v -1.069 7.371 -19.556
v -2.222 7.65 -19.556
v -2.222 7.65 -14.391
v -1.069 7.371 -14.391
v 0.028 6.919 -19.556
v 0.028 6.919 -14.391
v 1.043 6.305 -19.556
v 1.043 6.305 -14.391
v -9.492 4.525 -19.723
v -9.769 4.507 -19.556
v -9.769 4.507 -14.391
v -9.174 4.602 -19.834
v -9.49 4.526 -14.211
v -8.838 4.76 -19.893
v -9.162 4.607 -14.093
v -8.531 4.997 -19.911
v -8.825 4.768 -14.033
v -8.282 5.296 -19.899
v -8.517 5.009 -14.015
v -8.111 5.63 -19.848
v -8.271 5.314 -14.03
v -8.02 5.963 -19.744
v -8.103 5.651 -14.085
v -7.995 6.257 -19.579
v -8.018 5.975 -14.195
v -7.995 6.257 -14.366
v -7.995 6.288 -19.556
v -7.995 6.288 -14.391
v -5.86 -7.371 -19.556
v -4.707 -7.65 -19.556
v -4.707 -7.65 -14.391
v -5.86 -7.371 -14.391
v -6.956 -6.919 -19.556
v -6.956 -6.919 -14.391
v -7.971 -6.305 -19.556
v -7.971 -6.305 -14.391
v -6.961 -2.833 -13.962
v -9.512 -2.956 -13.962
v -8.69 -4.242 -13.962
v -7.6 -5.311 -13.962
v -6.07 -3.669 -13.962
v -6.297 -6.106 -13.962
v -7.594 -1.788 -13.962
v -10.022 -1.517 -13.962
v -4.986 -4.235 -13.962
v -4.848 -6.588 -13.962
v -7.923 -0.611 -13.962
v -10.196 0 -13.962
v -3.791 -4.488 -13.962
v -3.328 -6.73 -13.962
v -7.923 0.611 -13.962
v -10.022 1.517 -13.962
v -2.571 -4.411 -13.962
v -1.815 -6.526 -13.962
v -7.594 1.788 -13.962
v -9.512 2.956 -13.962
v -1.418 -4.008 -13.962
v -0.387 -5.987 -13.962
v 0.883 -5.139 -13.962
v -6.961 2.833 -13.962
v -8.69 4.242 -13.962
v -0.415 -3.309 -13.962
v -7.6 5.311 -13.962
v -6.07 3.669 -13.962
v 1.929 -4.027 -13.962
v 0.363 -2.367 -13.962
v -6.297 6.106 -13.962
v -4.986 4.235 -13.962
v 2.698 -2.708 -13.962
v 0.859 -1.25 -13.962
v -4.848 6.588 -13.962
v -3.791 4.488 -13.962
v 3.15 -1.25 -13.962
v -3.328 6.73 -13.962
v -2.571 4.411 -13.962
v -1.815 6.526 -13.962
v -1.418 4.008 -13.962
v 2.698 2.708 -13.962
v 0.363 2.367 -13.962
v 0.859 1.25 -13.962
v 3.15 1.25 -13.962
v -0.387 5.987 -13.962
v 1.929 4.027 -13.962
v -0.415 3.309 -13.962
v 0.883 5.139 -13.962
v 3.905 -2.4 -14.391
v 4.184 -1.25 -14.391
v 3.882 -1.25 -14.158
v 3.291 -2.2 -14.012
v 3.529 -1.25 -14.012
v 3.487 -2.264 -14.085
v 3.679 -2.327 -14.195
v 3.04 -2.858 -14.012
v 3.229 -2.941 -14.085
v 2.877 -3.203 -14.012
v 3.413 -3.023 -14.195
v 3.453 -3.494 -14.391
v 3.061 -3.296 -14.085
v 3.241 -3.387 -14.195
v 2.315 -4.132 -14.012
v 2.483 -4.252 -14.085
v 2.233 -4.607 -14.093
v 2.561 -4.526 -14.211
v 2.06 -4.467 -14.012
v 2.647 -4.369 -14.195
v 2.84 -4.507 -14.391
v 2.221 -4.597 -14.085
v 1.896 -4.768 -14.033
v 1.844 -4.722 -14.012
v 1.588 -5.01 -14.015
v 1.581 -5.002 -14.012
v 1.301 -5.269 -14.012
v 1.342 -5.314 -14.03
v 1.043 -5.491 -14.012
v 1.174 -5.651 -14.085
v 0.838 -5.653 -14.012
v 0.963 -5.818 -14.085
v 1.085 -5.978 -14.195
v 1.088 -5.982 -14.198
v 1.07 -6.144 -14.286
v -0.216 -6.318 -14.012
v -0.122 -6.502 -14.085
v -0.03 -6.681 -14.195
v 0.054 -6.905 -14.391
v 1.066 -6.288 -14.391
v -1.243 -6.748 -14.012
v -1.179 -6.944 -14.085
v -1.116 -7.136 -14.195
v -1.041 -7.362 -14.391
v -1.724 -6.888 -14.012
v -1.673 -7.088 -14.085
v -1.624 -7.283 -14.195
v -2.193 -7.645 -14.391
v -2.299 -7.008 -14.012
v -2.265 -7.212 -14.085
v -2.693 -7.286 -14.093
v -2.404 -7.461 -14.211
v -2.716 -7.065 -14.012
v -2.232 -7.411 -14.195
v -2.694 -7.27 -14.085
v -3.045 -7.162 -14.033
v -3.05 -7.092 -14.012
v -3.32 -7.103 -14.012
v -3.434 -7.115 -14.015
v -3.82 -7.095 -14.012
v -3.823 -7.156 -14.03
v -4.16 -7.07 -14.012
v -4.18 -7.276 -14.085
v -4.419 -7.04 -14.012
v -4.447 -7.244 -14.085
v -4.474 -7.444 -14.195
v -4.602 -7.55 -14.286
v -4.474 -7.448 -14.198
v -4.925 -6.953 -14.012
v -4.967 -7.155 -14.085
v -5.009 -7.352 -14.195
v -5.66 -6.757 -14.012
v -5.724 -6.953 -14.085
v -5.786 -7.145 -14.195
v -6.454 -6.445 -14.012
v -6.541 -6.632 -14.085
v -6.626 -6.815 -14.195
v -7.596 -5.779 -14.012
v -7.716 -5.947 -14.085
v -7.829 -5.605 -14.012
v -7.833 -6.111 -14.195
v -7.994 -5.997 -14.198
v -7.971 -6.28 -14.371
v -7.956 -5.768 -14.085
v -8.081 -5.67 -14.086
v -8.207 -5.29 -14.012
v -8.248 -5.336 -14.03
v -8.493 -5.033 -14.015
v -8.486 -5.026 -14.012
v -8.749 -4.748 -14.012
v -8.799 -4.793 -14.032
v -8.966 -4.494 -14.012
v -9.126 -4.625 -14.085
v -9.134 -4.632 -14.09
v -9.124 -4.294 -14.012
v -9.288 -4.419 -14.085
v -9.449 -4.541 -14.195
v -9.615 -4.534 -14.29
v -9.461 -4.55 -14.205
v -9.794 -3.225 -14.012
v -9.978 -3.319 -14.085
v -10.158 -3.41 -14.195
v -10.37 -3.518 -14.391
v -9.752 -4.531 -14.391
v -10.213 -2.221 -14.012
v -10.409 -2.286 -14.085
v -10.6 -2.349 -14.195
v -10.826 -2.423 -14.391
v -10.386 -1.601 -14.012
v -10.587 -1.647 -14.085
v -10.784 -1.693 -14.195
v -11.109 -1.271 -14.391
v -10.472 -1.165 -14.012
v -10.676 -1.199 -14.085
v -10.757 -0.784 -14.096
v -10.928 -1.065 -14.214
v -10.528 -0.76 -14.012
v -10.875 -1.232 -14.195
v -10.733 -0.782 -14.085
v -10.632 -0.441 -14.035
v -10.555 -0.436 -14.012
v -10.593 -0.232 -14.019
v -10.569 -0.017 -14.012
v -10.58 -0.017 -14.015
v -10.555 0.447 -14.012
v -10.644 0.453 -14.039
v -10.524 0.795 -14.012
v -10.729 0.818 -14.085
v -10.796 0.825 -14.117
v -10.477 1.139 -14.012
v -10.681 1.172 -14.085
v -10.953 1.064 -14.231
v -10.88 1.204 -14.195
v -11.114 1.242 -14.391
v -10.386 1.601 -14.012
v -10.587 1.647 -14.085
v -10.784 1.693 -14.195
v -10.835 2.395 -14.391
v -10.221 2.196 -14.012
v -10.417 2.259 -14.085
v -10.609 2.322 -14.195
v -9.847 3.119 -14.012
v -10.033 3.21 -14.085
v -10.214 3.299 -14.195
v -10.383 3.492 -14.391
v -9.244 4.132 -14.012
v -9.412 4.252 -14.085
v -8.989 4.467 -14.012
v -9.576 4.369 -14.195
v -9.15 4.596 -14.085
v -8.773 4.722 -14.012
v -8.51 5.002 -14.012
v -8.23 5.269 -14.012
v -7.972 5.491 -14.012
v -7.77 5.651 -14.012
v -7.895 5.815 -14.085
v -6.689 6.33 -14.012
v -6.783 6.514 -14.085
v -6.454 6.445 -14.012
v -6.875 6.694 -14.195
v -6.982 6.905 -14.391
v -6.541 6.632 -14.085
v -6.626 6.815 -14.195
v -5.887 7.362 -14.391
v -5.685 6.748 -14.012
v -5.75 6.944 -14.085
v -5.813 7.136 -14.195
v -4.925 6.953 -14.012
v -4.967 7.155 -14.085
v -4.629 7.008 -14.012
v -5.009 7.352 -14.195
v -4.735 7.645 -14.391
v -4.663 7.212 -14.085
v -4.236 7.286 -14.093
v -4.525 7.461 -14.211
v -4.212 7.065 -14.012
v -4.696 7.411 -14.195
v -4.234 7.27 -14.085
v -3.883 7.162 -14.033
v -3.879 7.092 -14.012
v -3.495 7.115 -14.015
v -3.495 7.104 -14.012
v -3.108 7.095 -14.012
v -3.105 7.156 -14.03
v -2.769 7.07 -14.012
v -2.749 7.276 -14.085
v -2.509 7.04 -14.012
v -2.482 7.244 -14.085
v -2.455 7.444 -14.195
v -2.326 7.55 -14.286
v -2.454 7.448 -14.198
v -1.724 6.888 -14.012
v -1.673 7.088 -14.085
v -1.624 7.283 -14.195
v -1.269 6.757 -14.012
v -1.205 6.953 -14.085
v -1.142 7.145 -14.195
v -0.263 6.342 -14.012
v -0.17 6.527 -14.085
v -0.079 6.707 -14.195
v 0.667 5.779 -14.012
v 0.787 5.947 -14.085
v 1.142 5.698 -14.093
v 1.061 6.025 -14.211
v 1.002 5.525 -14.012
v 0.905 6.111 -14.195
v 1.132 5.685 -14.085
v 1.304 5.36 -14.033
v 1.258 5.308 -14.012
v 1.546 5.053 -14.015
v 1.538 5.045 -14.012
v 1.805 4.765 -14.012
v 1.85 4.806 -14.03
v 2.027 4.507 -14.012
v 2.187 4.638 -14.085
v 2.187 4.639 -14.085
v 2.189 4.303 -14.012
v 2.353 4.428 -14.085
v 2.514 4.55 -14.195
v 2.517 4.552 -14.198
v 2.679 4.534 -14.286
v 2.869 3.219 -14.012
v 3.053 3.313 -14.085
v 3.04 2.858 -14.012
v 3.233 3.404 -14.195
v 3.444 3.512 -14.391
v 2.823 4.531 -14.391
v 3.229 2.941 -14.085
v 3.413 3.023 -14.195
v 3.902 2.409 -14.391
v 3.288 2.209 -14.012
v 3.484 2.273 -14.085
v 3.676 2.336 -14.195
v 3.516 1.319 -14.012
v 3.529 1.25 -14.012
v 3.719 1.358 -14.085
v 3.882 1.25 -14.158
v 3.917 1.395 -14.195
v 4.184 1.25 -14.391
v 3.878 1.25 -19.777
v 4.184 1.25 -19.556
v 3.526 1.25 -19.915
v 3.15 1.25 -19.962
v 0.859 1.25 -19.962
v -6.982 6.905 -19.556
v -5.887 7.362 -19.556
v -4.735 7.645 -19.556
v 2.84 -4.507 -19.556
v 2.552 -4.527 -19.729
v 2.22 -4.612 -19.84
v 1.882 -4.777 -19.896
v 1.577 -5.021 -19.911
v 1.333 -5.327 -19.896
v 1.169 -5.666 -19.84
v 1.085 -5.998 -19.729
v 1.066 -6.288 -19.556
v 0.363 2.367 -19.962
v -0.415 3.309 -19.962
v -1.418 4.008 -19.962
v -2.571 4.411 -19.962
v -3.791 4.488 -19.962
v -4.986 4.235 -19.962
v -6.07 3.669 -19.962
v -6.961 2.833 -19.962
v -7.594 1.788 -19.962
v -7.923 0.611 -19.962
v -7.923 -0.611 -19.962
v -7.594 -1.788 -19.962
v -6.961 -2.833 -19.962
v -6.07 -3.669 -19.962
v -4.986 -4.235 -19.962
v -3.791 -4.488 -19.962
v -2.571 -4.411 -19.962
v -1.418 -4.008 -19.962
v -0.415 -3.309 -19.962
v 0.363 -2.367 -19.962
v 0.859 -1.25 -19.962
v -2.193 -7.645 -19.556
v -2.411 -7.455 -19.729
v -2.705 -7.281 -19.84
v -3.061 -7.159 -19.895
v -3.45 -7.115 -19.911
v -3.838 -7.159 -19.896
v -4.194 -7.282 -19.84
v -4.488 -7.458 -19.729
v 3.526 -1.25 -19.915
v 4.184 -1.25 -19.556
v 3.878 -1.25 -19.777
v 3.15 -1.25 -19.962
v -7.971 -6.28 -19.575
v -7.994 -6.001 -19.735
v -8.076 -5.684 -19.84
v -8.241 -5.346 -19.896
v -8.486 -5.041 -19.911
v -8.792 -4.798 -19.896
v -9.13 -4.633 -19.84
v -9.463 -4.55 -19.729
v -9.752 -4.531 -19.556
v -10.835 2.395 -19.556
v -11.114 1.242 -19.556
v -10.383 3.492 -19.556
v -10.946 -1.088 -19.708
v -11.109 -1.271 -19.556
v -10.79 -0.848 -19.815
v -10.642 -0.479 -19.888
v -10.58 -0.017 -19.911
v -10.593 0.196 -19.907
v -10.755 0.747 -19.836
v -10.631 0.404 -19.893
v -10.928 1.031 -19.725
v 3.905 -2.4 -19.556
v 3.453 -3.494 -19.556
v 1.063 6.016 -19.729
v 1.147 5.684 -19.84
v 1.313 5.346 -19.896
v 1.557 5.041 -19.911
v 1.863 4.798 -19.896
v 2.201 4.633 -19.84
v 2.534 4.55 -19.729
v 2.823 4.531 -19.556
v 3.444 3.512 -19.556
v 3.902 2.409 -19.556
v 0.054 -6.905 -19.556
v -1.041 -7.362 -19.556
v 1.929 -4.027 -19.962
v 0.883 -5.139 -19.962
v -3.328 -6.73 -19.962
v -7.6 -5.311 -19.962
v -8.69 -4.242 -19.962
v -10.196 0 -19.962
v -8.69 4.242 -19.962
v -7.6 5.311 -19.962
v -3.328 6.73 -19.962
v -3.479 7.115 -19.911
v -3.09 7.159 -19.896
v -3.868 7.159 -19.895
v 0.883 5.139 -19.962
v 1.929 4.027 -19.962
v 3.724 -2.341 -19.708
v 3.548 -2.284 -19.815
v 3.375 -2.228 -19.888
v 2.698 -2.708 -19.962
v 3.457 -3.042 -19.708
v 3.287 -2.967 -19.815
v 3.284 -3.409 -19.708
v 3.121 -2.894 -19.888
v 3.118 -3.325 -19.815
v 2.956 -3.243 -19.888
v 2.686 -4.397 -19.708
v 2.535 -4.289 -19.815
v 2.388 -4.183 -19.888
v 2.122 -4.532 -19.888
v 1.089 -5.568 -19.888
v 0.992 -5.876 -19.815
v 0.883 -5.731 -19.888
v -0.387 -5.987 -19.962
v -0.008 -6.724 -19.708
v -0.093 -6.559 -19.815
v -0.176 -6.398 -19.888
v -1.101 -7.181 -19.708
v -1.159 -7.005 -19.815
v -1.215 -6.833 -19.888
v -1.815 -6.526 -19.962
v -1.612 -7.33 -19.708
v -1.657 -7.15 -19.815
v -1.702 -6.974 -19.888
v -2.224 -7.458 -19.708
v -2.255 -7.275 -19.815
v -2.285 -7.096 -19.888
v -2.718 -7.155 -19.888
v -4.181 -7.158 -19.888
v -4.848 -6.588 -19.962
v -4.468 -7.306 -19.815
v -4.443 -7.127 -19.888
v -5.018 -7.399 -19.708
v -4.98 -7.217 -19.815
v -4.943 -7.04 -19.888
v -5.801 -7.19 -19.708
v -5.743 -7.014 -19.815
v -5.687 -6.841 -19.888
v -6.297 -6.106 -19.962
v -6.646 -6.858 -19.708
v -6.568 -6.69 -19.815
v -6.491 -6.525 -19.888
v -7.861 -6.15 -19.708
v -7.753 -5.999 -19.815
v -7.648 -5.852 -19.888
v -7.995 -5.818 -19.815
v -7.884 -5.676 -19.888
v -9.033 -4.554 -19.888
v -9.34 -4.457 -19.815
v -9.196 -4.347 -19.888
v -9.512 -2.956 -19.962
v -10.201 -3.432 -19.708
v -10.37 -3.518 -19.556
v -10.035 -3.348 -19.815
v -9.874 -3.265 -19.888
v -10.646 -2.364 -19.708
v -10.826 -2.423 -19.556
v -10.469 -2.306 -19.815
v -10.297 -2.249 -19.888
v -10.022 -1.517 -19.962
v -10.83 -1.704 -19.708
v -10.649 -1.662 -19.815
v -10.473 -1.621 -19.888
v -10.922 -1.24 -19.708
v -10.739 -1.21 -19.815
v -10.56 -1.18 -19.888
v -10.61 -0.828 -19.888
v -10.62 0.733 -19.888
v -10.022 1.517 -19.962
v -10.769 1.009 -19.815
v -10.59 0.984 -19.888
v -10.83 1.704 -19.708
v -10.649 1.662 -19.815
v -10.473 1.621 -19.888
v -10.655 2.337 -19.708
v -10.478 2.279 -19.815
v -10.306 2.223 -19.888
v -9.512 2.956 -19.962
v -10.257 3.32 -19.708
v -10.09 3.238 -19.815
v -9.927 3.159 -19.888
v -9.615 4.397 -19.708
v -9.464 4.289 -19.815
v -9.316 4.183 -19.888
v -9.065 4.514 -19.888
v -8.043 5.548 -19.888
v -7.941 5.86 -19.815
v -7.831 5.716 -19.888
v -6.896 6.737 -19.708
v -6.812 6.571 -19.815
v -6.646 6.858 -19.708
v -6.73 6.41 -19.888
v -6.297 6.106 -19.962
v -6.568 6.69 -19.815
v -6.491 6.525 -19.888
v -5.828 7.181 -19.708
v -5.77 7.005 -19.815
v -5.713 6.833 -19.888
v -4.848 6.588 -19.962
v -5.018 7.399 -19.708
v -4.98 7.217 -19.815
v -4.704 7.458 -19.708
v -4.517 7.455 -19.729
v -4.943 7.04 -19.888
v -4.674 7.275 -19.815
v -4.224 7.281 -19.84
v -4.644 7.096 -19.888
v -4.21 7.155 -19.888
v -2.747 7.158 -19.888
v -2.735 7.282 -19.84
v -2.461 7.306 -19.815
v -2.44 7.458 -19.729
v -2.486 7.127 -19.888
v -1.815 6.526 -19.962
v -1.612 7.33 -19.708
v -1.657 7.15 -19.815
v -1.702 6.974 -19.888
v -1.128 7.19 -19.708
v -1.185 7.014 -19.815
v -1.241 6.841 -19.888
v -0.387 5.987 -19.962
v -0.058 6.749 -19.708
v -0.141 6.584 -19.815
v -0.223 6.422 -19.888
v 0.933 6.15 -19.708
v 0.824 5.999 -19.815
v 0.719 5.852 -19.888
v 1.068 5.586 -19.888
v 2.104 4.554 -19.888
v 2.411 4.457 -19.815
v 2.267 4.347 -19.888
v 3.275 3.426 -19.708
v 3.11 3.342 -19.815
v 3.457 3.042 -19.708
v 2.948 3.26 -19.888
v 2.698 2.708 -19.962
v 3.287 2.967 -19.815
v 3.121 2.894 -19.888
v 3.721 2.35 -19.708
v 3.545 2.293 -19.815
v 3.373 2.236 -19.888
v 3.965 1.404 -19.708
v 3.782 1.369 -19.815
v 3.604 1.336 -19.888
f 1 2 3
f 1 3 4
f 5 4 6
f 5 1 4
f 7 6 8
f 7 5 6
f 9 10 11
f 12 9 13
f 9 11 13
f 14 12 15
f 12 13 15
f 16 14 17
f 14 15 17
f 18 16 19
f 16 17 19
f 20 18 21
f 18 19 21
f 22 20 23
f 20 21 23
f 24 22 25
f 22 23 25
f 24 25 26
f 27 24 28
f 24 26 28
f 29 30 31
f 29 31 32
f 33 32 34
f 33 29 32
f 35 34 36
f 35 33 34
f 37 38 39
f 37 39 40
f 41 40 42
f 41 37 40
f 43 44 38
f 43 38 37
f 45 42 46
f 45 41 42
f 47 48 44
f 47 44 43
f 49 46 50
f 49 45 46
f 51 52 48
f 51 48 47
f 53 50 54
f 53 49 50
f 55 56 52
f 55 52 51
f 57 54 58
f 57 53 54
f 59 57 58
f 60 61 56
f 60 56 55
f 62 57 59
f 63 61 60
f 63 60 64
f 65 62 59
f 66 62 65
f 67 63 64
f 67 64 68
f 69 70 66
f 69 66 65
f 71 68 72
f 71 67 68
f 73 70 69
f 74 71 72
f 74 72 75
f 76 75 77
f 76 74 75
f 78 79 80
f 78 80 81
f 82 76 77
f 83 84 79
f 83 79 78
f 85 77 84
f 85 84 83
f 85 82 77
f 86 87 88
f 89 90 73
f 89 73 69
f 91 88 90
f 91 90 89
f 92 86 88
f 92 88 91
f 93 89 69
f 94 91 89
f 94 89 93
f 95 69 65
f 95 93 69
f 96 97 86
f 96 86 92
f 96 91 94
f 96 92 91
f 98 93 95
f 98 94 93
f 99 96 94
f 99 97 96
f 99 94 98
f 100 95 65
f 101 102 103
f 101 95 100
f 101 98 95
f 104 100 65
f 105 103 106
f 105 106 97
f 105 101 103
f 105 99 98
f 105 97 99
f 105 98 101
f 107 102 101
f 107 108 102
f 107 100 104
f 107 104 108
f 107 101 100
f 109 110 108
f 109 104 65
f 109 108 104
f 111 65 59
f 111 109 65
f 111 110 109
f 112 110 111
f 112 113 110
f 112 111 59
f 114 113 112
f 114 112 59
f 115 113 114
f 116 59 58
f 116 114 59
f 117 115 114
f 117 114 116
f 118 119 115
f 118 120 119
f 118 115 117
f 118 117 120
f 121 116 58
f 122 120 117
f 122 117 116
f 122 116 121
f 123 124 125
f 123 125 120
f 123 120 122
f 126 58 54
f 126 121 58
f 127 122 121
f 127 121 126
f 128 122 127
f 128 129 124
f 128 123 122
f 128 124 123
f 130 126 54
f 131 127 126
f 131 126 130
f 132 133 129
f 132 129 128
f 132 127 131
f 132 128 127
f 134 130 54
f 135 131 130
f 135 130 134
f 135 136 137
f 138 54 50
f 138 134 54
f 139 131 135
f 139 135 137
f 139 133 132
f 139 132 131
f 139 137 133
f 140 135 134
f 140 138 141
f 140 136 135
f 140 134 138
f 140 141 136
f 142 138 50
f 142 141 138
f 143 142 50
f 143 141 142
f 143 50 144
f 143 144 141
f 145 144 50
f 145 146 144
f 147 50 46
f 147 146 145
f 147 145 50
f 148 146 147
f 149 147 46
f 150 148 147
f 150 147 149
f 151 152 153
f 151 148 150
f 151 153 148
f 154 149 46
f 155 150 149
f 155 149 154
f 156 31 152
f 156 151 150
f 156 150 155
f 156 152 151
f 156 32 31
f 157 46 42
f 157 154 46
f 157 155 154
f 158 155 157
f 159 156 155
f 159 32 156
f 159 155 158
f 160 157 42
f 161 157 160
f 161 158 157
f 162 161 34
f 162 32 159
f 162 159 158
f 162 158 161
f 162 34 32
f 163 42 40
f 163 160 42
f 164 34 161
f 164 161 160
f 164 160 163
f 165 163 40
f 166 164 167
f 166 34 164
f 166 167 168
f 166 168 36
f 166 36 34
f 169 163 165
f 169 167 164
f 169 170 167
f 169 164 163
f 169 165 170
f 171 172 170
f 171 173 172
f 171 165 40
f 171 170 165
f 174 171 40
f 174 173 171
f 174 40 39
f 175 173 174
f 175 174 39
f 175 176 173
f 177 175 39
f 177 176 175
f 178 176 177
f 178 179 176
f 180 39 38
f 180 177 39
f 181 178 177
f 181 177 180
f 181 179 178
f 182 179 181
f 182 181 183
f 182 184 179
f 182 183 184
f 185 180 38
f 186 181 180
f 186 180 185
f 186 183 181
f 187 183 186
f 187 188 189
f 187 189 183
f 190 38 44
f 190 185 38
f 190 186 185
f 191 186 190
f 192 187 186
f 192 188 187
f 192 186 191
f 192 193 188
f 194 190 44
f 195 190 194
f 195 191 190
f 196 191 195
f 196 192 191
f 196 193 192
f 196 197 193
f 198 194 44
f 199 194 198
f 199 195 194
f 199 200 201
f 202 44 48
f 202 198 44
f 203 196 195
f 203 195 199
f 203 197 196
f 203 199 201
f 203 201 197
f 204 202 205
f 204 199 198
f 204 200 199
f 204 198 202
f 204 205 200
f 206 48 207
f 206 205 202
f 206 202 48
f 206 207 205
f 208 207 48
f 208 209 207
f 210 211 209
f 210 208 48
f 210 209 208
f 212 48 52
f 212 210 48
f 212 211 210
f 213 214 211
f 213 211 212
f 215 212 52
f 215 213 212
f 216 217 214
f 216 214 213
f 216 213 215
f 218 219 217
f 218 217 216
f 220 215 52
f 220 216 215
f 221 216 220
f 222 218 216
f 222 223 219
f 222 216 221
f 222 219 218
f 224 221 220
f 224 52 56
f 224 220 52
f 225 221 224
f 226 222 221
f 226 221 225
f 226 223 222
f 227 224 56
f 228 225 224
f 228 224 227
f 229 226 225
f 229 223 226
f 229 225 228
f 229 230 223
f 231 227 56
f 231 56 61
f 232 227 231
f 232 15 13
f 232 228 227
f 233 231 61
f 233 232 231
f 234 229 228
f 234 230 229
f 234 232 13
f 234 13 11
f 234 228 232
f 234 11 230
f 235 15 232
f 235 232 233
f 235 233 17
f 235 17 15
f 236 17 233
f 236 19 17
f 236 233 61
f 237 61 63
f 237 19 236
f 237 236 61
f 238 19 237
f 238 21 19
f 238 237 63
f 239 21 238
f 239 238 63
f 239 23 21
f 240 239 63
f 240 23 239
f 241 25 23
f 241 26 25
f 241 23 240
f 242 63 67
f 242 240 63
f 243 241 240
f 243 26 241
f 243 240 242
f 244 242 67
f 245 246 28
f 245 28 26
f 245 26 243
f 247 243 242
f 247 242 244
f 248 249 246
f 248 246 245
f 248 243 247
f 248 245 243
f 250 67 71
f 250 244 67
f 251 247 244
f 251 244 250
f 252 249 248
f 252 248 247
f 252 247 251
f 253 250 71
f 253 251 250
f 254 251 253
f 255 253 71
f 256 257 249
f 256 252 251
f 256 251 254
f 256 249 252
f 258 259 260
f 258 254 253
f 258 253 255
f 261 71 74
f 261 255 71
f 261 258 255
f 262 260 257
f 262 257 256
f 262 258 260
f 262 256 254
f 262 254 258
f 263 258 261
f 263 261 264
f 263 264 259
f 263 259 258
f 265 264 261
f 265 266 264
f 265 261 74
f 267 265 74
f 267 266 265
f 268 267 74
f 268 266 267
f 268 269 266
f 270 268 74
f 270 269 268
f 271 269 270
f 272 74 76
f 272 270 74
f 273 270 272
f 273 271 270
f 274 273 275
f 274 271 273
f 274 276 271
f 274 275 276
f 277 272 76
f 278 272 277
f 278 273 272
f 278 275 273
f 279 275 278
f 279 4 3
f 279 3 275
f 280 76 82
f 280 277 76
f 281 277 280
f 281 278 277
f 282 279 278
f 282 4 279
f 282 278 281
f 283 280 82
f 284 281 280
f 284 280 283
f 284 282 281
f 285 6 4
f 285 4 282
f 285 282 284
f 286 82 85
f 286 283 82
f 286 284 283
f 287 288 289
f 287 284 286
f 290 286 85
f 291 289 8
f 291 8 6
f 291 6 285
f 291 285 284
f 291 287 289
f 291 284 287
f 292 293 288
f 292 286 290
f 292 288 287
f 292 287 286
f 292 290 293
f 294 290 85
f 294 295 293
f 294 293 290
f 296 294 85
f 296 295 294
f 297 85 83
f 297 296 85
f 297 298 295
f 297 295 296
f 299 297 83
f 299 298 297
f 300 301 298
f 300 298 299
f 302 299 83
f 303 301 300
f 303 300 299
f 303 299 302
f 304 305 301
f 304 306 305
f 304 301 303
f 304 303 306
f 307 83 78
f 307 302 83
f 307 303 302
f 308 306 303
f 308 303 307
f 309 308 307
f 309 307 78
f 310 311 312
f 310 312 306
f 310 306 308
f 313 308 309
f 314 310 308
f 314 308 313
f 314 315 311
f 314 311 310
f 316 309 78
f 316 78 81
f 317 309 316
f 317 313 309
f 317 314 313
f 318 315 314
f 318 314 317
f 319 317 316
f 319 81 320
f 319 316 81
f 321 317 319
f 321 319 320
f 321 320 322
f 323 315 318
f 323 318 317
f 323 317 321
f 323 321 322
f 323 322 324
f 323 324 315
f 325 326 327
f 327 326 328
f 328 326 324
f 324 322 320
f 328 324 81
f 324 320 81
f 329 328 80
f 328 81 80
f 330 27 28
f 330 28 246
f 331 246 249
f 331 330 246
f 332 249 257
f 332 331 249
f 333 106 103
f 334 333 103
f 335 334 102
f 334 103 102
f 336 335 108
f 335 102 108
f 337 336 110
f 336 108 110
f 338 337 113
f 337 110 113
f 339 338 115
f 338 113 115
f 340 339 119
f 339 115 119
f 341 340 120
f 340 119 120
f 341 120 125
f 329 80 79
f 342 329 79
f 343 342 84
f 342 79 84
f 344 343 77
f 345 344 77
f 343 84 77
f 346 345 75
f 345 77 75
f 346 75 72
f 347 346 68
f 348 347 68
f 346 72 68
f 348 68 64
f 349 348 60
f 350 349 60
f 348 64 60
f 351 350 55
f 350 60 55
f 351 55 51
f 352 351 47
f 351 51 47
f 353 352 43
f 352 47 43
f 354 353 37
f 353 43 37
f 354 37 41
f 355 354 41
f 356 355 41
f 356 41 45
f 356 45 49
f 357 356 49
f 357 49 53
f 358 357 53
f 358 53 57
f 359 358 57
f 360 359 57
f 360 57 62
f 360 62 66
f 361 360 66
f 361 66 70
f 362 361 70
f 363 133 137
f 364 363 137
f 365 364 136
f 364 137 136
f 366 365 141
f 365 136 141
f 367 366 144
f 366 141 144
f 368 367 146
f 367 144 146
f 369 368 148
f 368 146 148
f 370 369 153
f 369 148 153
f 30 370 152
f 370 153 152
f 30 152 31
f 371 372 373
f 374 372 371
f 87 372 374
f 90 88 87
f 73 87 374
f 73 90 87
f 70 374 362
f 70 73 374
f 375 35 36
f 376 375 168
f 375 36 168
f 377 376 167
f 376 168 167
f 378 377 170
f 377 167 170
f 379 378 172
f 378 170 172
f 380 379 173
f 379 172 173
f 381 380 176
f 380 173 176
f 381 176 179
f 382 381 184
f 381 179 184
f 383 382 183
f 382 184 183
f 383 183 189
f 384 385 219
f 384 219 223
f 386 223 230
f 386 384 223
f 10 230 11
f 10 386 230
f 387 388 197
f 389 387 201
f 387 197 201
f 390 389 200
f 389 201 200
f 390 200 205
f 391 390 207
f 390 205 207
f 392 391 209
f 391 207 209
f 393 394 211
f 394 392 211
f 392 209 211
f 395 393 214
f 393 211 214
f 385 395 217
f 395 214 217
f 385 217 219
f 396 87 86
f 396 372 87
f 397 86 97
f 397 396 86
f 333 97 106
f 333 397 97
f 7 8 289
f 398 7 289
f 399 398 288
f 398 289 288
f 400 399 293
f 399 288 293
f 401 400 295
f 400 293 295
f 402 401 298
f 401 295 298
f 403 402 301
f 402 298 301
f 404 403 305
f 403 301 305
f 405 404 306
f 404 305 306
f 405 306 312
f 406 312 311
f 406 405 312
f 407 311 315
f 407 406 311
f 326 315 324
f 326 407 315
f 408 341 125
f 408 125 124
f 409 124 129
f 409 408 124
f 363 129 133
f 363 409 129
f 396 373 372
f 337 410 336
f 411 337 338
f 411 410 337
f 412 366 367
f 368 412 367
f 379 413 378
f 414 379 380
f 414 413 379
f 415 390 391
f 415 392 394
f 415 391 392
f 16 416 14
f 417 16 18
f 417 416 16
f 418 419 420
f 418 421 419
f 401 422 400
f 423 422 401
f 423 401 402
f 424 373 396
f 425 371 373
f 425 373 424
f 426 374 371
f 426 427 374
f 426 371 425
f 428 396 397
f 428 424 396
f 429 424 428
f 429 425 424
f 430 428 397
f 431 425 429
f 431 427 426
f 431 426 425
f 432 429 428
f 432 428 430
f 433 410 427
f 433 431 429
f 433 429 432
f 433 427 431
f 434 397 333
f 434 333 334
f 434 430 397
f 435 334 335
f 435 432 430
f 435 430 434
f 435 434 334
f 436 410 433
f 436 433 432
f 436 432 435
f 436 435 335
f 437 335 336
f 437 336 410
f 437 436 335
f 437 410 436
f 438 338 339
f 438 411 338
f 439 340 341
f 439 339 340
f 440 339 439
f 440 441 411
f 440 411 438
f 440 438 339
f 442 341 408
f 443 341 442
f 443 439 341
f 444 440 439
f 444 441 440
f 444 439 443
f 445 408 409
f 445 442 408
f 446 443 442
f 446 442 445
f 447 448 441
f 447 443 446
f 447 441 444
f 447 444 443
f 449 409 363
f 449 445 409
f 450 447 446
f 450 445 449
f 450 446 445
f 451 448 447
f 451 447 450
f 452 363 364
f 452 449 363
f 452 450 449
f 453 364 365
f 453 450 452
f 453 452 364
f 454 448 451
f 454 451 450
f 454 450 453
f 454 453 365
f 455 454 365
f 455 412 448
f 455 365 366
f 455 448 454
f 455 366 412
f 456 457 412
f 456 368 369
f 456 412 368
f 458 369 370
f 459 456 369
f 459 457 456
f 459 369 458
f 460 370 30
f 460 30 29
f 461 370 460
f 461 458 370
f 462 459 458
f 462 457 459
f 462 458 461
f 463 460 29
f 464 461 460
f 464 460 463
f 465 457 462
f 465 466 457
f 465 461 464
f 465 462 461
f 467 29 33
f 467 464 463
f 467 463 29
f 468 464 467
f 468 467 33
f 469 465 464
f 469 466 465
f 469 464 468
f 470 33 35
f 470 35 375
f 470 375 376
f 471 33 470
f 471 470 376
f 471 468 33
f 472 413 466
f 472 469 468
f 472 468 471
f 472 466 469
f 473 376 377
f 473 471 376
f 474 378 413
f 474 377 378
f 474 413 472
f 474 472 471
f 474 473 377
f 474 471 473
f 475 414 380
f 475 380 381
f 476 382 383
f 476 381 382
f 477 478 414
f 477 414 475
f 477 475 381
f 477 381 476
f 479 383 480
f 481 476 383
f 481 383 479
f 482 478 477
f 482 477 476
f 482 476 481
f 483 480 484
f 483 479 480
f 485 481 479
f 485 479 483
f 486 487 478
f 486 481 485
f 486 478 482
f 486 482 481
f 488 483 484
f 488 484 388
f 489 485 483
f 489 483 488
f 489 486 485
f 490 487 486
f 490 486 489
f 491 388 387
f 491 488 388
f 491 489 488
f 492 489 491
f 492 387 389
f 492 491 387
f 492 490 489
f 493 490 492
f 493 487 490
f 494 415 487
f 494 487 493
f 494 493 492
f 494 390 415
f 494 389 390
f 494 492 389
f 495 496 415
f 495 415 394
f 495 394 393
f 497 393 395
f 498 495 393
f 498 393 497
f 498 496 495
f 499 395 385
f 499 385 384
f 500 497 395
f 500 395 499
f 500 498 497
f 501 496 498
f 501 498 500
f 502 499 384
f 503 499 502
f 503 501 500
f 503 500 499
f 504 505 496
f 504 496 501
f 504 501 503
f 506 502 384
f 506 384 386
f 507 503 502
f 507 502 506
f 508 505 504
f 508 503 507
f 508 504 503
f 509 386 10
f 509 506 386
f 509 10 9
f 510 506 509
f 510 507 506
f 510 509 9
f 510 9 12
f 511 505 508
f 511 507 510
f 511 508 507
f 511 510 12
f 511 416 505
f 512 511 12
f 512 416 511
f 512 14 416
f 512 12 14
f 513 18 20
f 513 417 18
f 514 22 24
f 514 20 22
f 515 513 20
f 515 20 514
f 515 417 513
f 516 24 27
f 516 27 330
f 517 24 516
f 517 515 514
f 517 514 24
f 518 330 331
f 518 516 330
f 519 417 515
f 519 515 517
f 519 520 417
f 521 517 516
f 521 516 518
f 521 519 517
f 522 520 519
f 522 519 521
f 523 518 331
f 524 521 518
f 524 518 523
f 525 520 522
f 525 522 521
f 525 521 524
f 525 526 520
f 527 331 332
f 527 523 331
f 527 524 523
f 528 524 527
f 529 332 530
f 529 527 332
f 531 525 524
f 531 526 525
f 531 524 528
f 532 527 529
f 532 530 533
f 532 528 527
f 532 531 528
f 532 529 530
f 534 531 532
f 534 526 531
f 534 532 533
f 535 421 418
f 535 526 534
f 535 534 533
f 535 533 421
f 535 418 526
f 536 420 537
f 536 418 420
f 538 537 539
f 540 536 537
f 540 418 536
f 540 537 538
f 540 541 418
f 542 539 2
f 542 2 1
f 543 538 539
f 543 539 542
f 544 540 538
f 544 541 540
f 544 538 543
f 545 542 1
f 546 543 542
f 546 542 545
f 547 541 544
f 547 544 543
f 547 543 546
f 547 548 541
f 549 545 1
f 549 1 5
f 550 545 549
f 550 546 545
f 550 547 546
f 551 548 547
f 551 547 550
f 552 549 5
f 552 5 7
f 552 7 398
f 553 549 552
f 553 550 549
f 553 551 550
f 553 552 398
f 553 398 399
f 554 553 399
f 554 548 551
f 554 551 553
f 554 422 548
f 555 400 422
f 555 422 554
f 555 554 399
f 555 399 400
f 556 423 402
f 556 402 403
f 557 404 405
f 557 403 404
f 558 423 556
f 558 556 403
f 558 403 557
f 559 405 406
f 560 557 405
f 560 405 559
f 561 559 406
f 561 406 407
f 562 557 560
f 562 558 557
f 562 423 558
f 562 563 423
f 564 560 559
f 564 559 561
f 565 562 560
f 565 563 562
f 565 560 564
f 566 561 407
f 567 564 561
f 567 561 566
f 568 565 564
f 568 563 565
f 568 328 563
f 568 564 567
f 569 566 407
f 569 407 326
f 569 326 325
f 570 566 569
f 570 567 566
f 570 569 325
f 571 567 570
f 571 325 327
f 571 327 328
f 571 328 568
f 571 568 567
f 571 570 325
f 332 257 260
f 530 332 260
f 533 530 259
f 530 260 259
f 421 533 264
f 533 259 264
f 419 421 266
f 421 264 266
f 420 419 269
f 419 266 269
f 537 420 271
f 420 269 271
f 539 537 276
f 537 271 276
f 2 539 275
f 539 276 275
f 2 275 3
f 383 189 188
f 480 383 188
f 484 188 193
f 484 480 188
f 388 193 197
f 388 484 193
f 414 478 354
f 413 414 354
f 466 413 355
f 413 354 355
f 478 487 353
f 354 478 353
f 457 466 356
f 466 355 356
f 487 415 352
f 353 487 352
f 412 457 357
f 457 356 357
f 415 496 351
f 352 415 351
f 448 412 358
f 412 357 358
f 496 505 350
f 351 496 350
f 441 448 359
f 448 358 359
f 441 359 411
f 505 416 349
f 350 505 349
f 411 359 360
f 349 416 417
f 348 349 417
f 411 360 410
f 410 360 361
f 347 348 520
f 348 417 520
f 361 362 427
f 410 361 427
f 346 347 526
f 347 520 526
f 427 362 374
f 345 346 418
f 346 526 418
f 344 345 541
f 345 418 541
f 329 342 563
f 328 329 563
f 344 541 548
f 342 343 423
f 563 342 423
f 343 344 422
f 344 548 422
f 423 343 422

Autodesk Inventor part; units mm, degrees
ref_plane "YZ Plane" through (0, 0, 0) normal (1, 0, 0) x (0, 1, 0)
ref_plane "XZ Plane" through (0, 0, 0) normal (0, 1, 0) x (-1, 0, 0)
ref_plane "XY Plane" through (0, 0, 0) normal (0, 0, 1) x (1, 0, 0)
sketch "Sketch1" plane through (0, 0, 0) normal (0, 1, 0) x (-1, 0, 0)
  line L0 (-1.1714, -12.4618) -> (-1.1714, -27.4618) construction
  line L1 (8.1, -25.7) -> (8.1, -10.7) construction
  line L2 (-1.1714, -21.2152) -> (8.1, -21.2152) construction
  line L3 (3.4643, -21.2152) -> (3.4643, 9.1343) construction
  line L4 (-3.267, -19.9618) -> (-1.0357, -19.9618)
  line L5 (-1.0357, -19.9618) -> (-1.0357, -13.9618)
  line L6 (-1.0357, -13.9618) -> (-3.267, -13.9618)
  line L7 (-4.2857, -14.3912) -> (-4.2857, -19.5563)
  arc A0 (-4.2857, -19.5563) -> (-3.267, -19.9618) centre (-3.267, -18.4795) ccw
  arc A1 (-3.267, -13.9618) -> (-4.2857, -14.3912) centre (-3.267, -15.3848) ccw
  point P0 (0, 0)
  dimension "d0" = 7.75
  dimension "d1" = 4.5
  dimension "d2" = 6
revolve "Revolution1" add sketch "Sketch1" angle 360 about axis through (-3.4643, 0, -21.2152) along (0, 0, 1)
sketch "Sketch2" plane through (-3.4643, 0, -13.9618) normal (0, 0, 1) x (1, 0, 0)
  circle A0 centre (0.0167, -8.8653) radius 1.75
  circle A1 centre (6.2805, -6.2569) radius 1.75
  circle A2 centre (8.8653, 0.0167) radius 1.75
  circle A3 centre (6.2569, 6.2805) radius 1.75
  circle A4 centre (-0.0167, 8.8653) radius 1.75
  circle A5 centre (-6.2805, 6.2569) radius 1.75
  circle A6 centre (-8.8653, -0.0167) radius 1.75
  circle A7 centre (-6.2569, -6.2805) radius 1.75
  point P0 (3.4643, 0)
  point P1 (0, 0)
  dimension "d4" = 3.5
  dimension "d7" = 360
extrude "Extrusion1" cut sketch "Sketch2" against normal blind 10 contours A0 | A1 | A3 | A4 | A5 | A6 | A7
sketch "Sketch3" plane through (-3.4643, 0, -13.9618) normal (0, 0, 1) x (1, 0, 0)
  line L0 (0, 0) -> (8.4123, 0) construction
  line L1 (8.4123, 0) -> (8.4123, -1.25)
  line L2 (8.4123, -1.25) -> (0, -1.25)
  line L3 (0, -1.25) -> (0, 0)
  line L4 (8.4123, 0) -> (8.4123, 1.25)
  line L5 (8.4123, 1.25) -> (0, 1.25)
  line L6 (0, 1.25) -> (0, 0)
  point P0 (3.4643, 0)
  dimension "d11" = 1.25
extrude "Extrusion2" cut sketch "Sketch3" against normal blind 10
properties part number "PWTR-0108" material "Aluminum 6061"
